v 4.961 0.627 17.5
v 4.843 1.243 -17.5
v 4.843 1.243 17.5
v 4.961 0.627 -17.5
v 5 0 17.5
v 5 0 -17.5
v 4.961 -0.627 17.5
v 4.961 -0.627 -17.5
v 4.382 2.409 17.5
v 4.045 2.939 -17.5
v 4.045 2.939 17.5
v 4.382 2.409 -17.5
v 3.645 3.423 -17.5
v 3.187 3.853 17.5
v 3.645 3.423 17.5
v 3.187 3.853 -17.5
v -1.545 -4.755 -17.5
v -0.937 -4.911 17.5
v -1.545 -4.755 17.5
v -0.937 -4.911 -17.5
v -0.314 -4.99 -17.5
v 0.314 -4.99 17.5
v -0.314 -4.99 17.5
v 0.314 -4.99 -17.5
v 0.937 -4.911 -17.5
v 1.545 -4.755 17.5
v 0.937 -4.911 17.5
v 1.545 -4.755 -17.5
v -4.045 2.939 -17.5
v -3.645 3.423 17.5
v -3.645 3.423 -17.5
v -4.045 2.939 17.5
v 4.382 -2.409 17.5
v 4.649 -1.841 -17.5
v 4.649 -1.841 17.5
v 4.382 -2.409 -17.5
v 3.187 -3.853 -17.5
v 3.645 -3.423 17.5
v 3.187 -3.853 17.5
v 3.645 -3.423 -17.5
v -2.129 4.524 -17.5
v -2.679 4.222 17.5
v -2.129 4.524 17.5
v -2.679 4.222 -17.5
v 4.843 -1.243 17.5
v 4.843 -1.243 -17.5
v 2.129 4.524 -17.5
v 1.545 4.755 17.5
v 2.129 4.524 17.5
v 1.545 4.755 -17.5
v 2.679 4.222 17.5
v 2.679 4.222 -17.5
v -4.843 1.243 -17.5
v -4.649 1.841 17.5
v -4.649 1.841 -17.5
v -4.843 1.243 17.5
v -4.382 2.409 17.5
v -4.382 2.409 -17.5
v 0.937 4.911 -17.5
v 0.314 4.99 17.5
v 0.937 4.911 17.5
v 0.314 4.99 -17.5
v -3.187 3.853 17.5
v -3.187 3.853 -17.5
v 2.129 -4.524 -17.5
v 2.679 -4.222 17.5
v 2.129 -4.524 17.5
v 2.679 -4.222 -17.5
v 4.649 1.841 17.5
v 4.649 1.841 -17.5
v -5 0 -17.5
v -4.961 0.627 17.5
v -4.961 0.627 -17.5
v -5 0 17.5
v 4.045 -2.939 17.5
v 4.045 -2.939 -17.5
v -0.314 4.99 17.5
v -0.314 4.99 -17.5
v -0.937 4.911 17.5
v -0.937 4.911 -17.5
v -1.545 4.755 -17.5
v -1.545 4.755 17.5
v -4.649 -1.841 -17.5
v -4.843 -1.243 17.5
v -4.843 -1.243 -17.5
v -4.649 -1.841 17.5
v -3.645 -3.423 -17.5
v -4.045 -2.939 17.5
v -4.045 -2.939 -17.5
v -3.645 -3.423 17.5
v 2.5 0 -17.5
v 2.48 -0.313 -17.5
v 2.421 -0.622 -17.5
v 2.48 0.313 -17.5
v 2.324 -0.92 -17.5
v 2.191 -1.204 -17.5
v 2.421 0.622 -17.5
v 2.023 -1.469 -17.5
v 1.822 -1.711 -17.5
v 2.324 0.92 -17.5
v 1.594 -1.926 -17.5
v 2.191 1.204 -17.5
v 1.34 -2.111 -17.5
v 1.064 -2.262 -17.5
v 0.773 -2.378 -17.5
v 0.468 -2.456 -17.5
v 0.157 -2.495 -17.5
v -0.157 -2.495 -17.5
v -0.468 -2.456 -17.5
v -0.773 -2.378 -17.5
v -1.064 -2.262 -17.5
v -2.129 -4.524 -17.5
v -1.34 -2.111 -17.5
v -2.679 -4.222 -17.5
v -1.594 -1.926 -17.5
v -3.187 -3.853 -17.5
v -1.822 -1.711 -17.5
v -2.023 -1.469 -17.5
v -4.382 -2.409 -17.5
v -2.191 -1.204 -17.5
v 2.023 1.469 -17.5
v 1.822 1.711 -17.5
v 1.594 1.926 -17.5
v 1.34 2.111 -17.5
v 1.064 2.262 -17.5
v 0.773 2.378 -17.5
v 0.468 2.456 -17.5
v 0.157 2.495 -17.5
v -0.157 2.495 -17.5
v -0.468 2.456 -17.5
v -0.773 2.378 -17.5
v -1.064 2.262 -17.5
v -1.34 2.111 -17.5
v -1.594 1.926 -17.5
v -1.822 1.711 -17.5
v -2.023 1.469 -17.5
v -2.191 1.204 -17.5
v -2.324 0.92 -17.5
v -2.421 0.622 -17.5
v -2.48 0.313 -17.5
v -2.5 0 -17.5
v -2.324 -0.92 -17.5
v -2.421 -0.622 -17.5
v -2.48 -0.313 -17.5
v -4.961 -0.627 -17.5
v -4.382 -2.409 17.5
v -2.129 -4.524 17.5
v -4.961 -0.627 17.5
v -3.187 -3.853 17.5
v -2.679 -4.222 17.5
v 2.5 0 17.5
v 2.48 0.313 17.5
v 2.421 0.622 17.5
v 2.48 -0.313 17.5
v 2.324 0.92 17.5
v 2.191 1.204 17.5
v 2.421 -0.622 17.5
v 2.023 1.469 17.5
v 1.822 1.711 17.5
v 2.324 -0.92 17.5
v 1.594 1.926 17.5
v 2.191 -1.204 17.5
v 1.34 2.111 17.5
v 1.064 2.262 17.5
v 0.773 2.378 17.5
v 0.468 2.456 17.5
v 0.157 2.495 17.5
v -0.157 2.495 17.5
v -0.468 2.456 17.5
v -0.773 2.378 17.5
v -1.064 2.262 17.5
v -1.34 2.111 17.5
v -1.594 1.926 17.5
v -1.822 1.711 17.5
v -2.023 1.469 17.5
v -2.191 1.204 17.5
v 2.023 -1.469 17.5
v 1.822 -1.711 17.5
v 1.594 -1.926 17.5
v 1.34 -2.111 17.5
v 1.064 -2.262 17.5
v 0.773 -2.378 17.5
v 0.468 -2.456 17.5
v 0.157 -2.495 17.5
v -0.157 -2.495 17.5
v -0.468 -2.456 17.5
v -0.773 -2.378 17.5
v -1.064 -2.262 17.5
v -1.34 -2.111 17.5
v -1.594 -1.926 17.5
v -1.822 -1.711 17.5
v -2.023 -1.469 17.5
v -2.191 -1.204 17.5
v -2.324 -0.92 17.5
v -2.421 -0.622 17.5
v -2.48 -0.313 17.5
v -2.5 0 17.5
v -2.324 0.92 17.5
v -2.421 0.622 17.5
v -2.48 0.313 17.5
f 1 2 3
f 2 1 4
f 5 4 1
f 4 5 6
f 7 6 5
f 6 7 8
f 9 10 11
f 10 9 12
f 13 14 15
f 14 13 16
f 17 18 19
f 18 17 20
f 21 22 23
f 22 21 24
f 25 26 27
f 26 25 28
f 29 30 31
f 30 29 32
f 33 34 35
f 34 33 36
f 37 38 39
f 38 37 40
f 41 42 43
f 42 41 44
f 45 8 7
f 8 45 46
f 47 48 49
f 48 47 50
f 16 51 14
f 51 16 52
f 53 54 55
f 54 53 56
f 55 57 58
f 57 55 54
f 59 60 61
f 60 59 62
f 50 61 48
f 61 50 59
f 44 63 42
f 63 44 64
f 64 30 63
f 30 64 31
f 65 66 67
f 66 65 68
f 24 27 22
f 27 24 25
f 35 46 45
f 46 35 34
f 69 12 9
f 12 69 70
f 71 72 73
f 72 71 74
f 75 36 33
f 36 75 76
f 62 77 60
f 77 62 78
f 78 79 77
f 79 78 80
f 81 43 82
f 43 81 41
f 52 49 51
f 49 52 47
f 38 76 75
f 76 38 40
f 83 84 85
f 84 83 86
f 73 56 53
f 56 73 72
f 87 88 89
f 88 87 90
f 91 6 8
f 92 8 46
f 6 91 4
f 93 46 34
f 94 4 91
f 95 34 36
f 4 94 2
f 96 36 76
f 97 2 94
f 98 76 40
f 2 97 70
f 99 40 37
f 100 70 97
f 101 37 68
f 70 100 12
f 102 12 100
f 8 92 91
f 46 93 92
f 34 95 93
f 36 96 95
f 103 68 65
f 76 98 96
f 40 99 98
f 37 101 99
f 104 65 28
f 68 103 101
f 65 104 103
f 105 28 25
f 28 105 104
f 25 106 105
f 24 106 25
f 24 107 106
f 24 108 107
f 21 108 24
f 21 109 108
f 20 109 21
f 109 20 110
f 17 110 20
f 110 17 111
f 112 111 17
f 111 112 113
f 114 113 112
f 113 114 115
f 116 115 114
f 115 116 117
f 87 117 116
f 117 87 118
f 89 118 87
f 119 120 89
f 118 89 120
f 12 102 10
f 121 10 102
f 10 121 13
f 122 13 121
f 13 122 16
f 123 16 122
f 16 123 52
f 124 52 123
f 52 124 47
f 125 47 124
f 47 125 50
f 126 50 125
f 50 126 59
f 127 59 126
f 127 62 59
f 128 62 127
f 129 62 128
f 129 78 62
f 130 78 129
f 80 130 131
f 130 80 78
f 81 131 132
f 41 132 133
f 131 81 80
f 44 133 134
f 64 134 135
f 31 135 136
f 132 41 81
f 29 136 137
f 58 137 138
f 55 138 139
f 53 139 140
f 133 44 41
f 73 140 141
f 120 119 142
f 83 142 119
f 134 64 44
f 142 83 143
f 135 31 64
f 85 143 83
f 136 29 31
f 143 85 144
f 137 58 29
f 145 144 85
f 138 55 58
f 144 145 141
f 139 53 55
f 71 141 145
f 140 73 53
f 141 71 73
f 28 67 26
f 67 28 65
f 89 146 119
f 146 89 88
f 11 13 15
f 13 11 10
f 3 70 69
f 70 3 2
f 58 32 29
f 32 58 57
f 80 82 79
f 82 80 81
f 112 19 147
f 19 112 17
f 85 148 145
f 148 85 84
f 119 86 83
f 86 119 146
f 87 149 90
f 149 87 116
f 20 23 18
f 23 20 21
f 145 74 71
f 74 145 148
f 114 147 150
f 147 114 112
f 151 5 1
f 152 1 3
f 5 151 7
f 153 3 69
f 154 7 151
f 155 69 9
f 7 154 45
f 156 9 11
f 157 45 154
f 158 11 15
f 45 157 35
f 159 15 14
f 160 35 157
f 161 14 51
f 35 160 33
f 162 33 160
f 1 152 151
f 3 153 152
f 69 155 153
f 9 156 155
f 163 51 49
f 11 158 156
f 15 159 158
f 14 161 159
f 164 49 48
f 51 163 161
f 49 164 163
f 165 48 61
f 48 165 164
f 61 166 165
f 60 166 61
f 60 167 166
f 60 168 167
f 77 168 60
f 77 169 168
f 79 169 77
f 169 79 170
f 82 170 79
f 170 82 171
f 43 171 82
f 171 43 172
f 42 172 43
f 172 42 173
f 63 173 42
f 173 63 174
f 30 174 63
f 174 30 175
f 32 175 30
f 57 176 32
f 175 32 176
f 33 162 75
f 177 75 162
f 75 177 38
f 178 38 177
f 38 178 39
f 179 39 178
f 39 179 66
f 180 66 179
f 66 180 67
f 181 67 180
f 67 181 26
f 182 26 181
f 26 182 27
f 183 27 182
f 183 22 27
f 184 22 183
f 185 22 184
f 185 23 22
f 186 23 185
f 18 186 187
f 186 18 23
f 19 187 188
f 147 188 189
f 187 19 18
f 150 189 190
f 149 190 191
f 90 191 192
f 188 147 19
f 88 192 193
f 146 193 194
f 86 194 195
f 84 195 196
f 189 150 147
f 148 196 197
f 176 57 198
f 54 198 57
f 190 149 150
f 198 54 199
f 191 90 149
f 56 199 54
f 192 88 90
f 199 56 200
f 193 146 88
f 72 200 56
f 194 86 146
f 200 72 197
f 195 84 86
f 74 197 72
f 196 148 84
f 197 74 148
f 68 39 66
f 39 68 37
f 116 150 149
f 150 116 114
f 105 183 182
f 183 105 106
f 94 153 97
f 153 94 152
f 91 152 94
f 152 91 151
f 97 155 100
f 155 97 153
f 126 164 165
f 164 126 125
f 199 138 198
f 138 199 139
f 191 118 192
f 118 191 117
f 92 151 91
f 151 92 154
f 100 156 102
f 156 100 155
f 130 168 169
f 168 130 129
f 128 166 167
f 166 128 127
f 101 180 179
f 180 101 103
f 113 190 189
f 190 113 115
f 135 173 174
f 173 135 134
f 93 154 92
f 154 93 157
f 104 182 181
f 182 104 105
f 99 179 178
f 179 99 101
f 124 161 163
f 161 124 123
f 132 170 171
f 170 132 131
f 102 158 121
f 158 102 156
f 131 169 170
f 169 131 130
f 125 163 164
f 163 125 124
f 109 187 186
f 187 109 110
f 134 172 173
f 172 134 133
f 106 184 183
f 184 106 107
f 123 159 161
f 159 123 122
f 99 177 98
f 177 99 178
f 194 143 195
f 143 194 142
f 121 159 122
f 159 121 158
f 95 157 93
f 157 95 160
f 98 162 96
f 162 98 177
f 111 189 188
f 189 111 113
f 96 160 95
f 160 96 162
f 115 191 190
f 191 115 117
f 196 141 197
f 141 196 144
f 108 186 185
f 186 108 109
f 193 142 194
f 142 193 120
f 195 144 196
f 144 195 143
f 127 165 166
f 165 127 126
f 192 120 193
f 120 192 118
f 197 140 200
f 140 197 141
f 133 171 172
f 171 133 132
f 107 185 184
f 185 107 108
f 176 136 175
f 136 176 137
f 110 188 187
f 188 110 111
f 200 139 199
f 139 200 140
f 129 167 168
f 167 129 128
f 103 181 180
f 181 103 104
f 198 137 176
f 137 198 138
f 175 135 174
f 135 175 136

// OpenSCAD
$fn = 50;


difference() {
	union() {
		translate(v = [0, 0, -17.5000000000]) {
			cylinder(h = 35, r = 5.0000000000);
		}
	}
	union() {
		translate(v = [0, 0, -100.0000000000]) {
			cylinder(h = 200, r = 2.5000000000);
		}
	}
}
